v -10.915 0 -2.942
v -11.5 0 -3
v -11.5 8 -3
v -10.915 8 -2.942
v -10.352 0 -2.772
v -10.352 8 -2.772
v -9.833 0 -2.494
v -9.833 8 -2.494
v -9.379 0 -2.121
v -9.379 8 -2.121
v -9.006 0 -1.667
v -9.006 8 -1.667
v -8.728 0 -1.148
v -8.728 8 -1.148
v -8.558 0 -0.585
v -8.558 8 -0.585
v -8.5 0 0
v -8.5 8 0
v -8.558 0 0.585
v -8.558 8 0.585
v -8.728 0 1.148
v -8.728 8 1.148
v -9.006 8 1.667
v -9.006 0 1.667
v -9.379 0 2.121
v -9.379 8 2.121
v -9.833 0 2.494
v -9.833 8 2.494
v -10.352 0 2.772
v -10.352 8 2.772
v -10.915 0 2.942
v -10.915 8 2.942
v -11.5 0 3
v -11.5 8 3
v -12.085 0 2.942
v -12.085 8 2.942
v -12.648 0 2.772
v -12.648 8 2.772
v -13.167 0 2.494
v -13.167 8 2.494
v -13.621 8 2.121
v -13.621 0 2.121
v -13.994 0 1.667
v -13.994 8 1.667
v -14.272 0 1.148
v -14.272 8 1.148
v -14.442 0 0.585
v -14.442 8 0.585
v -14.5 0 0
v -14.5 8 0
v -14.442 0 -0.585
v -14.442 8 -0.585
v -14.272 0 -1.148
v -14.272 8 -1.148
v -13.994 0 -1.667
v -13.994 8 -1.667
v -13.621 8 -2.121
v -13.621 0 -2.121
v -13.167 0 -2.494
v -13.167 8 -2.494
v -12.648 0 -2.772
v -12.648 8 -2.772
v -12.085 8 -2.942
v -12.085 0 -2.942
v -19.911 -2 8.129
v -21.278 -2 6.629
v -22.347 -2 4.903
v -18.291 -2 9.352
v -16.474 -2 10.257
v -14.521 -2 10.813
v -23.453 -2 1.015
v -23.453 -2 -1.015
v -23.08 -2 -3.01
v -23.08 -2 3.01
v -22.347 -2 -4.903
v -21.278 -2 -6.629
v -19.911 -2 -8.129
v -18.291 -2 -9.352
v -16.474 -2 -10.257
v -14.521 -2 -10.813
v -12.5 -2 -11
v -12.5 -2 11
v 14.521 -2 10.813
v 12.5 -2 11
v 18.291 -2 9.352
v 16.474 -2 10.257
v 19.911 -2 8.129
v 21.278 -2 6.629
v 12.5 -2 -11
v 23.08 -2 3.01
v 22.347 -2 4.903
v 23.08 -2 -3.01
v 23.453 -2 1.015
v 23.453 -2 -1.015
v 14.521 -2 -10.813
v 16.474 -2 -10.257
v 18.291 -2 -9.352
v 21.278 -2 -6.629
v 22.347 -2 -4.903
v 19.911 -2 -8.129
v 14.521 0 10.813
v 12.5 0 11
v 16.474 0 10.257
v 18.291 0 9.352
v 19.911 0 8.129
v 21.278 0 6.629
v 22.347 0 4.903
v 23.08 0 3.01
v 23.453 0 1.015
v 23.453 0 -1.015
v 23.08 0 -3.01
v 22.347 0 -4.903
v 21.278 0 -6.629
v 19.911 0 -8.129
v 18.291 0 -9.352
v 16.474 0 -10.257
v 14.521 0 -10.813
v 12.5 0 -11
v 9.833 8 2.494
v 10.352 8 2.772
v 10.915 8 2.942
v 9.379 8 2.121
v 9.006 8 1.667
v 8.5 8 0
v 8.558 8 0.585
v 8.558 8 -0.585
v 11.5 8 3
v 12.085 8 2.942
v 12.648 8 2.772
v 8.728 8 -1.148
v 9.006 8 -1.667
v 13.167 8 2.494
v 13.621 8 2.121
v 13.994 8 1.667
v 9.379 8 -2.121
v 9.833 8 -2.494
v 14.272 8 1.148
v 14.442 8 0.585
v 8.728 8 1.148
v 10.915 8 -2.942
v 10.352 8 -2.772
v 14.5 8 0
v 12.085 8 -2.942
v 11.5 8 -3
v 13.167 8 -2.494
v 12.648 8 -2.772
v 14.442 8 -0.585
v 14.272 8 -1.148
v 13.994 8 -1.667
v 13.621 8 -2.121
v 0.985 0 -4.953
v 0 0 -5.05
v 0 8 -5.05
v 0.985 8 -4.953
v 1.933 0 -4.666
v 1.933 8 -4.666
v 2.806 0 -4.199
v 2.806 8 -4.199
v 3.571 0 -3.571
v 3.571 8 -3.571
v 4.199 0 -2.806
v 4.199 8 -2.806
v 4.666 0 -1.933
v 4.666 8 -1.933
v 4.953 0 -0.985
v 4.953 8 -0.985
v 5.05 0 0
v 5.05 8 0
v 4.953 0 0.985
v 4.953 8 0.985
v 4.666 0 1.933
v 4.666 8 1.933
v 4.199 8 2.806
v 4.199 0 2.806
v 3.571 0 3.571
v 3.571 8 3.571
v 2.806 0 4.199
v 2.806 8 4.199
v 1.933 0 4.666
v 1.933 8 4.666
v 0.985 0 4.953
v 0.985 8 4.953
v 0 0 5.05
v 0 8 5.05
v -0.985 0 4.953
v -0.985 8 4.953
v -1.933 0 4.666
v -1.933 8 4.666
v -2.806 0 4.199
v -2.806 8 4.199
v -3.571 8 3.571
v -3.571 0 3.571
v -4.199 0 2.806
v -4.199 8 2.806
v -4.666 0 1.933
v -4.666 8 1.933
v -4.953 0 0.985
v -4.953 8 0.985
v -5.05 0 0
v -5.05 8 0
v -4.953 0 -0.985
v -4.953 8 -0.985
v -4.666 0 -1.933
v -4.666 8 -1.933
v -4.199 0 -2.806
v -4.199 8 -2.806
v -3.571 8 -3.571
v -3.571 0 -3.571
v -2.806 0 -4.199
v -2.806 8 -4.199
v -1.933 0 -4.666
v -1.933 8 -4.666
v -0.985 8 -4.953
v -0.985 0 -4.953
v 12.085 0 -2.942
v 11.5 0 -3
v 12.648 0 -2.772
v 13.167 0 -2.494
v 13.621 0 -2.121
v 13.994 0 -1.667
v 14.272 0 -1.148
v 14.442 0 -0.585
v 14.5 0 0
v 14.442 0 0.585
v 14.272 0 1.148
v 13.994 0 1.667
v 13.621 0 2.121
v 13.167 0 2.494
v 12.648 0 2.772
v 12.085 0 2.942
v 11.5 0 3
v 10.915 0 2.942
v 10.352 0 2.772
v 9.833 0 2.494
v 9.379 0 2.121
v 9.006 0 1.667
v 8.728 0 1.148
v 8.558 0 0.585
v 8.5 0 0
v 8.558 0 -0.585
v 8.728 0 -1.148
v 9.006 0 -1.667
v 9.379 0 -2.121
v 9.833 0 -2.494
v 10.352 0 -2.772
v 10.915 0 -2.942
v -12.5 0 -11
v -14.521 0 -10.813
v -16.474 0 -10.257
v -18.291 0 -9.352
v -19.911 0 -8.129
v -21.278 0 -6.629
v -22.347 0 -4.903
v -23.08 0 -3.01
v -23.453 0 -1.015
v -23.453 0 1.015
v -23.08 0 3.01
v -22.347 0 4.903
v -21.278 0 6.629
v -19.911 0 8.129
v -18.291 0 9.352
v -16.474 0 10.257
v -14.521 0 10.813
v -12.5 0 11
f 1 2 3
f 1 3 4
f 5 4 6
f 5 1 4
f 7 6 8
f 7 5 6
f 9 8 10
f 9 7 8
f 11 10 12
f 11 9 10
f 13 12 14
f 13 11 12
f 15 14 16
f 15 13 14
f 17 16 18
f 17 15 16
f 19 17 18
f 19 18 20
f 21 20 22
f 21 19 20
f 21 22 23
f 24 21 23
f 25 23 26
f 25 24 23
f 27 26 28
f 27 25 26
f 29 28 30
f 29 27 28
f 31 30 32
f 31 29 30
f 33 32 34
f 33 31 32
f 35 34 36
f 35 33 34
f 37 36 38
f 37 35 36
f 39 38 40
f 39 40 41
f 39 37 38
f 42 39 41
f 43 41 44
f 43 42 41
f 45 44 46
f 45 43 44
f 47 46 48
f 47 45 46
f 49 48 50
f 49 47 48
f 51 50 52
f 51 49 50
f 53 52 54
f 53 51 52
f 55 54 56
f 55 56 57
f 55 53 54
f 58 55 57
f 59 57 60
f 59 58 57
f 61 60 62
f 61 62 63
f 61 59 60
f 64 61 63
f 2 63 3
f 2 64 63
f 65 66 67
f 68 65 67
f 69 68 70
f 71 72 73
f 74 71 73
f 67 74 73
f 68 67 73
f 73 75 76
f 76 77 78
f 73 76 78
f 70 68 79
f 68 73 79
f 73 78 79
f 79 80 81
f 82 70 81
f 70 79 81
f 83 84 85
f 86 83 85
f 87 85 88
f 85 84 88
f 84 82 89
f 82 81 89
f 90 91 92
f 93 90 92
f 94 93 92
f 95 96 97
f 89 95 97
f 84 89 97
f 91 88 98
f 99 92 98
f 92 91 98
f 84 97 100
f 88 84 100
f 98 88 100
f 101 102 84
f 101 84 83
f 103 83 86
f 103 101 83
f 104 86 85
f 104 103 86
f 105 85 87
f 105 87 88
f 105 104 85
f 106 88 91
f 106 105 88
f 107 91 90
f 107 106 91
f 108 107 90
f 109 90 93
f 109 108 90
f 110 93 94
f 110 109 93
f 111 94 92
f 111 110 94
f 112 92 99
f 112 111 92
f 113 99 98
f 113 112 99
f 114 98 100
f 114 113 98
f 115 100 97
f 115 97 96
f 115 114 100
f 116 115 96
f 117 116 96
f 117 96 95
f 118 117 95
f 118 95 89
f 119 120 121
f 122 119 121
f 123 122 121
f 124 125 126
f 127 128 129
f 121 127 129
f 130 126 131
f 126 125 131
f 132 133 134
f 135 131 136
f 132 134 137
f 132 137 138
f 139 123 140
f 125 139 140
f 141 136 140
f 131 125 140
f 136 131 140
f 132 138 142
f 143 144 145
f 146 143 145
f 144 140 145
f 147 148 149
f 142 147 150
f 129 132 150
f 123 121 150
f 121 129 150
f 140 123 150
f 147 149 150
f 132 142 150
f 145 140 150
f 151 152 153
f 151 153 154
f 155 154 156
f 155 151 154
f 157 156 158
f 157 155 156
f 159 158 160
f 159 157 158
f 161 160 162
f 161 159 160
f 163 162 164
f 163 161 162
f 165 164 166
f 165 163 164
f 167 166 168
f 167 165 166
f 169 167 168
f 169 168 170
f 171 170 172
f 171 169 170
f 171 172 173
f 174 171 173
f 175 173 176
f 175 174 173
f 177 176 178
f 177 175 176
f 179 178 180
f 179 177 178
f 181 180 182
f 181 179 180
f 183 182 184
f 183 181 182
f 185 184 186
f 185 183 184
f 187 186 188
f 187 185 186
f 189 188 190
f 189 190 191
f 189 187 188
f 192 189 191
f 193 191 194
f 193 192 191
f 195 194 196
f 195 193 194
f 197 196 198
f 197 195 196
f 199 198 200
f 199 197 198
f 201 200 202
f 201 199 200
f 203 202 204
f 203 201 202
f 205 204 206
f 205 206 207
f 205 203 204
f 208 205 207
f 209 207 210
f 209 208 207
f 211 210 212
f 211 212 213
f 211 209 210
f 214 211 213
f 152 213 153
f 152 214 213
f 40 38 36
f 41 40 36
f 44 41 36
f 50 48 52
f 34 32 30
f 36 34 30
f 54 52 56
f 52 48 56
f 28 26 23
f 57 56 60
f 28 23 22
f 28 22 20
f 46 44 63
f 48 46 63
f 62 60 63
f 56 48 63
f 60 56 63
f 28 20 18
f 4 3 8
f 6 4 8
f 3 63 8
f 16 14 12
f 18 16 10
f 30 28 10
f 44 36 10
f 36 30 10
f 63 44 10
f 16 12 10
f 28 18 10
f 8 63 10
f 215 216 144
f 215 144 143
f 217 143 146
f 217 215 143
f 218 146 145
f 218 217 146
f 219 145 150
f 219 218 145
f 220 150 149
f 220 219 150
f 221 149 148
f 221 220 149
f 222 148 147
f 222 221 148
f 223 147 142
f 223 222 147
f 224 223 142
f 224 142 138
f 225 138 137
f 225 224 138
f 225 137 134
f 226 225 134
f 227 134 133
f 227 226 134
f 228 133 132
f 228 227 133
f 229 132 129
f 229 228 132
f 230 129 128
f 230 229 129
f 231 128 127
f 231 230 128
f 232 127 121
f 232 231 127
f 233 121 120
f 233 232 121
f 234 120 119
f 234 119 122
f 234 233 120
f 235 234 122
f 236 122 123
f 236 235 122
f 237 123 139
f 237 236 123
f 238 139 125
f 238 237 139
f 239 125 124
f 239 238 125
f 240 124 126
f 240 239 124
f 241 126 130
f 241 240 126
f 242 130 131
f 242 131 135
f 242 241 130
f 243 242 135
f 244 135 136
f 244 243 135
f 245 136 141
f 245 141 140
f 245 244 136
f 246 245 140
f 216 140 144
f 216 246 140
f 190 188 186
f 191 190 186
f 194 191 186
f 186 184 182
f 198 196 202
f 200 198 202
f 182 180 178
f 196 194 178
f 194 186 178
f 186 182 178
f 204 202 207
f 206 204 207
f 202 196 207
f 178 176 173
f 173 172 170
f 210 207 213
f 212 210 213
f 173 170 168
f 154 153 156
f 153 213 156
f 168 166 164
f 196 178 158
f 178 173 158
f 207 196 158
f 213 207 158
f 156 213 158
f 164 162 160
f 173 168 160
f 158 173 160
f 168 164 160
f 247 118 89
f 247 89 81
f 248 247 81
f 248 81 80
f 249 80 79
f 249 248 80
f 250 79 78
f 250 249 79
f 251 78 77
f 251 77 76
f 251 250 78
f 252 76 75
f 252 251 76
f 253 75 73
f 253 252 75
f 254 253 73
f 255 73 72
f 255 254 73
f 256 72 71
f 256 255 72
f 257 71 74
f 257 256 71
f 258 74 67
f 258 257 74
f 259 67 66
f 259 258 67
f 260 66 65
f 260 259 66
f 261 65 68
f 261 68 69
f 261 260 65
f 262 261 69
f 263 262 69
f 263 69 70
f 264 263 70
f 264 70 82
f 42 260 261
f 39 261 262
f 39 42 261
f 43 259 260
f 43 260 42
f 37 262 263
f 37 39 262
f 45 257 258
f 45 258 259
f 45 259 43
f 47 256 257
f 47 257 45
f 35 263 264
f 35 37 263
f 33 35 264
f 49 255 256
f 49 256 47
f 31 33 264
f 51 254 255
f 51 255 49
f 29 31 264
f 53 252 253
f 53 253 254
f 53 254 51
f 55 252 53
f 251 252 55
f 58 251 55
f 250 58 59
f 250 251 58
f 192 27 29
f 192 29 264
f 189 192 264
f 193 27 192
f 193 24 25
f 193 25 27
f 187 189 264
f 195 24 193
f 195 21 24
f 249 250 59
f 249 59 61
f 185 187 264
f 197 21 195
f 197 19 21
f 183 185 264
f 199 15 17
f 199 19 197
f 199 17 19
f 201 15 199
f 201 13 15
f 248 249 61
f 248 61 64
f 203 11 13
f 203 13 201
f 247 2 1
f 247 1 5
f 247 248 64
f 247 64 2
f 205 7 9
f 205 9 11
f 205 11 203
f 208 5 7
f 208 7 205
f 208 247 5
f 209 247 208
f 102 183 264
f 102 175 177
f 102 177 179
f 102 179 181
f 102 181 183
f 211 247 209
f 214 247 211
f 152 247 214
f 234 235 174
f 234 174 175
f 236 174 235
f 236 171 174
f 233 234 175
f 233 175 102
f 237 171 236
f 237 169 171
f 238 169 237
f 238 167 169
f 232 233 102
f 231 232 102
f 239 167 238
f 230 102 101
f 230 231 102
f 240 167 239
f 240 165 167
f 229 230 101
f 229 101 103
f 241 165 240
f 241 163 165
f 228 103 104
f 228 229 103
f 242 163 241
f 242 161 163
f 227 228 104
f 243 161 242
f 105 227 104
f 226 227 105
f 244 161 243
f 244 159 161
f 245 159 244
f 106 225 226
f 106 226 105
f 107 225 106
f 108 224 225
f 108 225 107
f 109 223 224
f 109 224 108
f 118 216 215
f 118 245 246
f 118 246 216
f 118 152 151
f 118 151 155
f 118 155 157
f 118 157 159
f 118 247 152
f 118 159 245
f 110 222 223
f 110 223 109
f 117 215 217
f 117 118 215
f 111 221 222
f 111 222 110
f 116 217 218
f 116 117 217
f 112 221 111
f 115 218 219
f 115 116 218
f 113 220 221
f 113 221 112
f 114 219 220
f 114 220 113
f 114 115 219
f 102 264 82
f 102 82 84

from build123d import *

# Parameters (mm, degrees)
BOSS_EXTRUDE10_DEPTH = 2
SKETCH14_R           = 3
SKETCH14_R_2         = 5.05
BOSS_EXTRUDE11_DEPTH = 8


with BuildPart() as part:
    # Sketch13 → Boss-Extrude10 (new body)
    with BuildSketch(Plane(origin=(-28.225984218, 0, 0), x_dir=(-1, 0, 0), z_dir=(0, -1, 0))):
        with BuildLine():
            Line((-40.725984218, 11), (-15.725984218, 11))
            ThreePointArc((-15.725984218, 11), (-4.725984218, 0), (-15.725984218, -11))
            Line((-15.725984218, -11), (-40.725984218, -11))
            ThreePointArc((-40.725984218, -11), (-51.725984218, 0), (-40.725984218, 11))
        make_face()
    extrude(amount=BOSS_EXTRUDE10_DEPTH)

    # Sketch14 → Boss-Extrude11 (add)
    with BuildSketch(Plane.XZ):
        with Locations((-11.5, 0)):
            Circle(SKETCH14_R)
        Circle(SKETCH14_R_2)
        with Locations((11.5, 0)):
            Circle(SKETCH14_R)
    extrude(amount=-BOSS_EXTRUDE11_DEPTH)


solid = part.part
